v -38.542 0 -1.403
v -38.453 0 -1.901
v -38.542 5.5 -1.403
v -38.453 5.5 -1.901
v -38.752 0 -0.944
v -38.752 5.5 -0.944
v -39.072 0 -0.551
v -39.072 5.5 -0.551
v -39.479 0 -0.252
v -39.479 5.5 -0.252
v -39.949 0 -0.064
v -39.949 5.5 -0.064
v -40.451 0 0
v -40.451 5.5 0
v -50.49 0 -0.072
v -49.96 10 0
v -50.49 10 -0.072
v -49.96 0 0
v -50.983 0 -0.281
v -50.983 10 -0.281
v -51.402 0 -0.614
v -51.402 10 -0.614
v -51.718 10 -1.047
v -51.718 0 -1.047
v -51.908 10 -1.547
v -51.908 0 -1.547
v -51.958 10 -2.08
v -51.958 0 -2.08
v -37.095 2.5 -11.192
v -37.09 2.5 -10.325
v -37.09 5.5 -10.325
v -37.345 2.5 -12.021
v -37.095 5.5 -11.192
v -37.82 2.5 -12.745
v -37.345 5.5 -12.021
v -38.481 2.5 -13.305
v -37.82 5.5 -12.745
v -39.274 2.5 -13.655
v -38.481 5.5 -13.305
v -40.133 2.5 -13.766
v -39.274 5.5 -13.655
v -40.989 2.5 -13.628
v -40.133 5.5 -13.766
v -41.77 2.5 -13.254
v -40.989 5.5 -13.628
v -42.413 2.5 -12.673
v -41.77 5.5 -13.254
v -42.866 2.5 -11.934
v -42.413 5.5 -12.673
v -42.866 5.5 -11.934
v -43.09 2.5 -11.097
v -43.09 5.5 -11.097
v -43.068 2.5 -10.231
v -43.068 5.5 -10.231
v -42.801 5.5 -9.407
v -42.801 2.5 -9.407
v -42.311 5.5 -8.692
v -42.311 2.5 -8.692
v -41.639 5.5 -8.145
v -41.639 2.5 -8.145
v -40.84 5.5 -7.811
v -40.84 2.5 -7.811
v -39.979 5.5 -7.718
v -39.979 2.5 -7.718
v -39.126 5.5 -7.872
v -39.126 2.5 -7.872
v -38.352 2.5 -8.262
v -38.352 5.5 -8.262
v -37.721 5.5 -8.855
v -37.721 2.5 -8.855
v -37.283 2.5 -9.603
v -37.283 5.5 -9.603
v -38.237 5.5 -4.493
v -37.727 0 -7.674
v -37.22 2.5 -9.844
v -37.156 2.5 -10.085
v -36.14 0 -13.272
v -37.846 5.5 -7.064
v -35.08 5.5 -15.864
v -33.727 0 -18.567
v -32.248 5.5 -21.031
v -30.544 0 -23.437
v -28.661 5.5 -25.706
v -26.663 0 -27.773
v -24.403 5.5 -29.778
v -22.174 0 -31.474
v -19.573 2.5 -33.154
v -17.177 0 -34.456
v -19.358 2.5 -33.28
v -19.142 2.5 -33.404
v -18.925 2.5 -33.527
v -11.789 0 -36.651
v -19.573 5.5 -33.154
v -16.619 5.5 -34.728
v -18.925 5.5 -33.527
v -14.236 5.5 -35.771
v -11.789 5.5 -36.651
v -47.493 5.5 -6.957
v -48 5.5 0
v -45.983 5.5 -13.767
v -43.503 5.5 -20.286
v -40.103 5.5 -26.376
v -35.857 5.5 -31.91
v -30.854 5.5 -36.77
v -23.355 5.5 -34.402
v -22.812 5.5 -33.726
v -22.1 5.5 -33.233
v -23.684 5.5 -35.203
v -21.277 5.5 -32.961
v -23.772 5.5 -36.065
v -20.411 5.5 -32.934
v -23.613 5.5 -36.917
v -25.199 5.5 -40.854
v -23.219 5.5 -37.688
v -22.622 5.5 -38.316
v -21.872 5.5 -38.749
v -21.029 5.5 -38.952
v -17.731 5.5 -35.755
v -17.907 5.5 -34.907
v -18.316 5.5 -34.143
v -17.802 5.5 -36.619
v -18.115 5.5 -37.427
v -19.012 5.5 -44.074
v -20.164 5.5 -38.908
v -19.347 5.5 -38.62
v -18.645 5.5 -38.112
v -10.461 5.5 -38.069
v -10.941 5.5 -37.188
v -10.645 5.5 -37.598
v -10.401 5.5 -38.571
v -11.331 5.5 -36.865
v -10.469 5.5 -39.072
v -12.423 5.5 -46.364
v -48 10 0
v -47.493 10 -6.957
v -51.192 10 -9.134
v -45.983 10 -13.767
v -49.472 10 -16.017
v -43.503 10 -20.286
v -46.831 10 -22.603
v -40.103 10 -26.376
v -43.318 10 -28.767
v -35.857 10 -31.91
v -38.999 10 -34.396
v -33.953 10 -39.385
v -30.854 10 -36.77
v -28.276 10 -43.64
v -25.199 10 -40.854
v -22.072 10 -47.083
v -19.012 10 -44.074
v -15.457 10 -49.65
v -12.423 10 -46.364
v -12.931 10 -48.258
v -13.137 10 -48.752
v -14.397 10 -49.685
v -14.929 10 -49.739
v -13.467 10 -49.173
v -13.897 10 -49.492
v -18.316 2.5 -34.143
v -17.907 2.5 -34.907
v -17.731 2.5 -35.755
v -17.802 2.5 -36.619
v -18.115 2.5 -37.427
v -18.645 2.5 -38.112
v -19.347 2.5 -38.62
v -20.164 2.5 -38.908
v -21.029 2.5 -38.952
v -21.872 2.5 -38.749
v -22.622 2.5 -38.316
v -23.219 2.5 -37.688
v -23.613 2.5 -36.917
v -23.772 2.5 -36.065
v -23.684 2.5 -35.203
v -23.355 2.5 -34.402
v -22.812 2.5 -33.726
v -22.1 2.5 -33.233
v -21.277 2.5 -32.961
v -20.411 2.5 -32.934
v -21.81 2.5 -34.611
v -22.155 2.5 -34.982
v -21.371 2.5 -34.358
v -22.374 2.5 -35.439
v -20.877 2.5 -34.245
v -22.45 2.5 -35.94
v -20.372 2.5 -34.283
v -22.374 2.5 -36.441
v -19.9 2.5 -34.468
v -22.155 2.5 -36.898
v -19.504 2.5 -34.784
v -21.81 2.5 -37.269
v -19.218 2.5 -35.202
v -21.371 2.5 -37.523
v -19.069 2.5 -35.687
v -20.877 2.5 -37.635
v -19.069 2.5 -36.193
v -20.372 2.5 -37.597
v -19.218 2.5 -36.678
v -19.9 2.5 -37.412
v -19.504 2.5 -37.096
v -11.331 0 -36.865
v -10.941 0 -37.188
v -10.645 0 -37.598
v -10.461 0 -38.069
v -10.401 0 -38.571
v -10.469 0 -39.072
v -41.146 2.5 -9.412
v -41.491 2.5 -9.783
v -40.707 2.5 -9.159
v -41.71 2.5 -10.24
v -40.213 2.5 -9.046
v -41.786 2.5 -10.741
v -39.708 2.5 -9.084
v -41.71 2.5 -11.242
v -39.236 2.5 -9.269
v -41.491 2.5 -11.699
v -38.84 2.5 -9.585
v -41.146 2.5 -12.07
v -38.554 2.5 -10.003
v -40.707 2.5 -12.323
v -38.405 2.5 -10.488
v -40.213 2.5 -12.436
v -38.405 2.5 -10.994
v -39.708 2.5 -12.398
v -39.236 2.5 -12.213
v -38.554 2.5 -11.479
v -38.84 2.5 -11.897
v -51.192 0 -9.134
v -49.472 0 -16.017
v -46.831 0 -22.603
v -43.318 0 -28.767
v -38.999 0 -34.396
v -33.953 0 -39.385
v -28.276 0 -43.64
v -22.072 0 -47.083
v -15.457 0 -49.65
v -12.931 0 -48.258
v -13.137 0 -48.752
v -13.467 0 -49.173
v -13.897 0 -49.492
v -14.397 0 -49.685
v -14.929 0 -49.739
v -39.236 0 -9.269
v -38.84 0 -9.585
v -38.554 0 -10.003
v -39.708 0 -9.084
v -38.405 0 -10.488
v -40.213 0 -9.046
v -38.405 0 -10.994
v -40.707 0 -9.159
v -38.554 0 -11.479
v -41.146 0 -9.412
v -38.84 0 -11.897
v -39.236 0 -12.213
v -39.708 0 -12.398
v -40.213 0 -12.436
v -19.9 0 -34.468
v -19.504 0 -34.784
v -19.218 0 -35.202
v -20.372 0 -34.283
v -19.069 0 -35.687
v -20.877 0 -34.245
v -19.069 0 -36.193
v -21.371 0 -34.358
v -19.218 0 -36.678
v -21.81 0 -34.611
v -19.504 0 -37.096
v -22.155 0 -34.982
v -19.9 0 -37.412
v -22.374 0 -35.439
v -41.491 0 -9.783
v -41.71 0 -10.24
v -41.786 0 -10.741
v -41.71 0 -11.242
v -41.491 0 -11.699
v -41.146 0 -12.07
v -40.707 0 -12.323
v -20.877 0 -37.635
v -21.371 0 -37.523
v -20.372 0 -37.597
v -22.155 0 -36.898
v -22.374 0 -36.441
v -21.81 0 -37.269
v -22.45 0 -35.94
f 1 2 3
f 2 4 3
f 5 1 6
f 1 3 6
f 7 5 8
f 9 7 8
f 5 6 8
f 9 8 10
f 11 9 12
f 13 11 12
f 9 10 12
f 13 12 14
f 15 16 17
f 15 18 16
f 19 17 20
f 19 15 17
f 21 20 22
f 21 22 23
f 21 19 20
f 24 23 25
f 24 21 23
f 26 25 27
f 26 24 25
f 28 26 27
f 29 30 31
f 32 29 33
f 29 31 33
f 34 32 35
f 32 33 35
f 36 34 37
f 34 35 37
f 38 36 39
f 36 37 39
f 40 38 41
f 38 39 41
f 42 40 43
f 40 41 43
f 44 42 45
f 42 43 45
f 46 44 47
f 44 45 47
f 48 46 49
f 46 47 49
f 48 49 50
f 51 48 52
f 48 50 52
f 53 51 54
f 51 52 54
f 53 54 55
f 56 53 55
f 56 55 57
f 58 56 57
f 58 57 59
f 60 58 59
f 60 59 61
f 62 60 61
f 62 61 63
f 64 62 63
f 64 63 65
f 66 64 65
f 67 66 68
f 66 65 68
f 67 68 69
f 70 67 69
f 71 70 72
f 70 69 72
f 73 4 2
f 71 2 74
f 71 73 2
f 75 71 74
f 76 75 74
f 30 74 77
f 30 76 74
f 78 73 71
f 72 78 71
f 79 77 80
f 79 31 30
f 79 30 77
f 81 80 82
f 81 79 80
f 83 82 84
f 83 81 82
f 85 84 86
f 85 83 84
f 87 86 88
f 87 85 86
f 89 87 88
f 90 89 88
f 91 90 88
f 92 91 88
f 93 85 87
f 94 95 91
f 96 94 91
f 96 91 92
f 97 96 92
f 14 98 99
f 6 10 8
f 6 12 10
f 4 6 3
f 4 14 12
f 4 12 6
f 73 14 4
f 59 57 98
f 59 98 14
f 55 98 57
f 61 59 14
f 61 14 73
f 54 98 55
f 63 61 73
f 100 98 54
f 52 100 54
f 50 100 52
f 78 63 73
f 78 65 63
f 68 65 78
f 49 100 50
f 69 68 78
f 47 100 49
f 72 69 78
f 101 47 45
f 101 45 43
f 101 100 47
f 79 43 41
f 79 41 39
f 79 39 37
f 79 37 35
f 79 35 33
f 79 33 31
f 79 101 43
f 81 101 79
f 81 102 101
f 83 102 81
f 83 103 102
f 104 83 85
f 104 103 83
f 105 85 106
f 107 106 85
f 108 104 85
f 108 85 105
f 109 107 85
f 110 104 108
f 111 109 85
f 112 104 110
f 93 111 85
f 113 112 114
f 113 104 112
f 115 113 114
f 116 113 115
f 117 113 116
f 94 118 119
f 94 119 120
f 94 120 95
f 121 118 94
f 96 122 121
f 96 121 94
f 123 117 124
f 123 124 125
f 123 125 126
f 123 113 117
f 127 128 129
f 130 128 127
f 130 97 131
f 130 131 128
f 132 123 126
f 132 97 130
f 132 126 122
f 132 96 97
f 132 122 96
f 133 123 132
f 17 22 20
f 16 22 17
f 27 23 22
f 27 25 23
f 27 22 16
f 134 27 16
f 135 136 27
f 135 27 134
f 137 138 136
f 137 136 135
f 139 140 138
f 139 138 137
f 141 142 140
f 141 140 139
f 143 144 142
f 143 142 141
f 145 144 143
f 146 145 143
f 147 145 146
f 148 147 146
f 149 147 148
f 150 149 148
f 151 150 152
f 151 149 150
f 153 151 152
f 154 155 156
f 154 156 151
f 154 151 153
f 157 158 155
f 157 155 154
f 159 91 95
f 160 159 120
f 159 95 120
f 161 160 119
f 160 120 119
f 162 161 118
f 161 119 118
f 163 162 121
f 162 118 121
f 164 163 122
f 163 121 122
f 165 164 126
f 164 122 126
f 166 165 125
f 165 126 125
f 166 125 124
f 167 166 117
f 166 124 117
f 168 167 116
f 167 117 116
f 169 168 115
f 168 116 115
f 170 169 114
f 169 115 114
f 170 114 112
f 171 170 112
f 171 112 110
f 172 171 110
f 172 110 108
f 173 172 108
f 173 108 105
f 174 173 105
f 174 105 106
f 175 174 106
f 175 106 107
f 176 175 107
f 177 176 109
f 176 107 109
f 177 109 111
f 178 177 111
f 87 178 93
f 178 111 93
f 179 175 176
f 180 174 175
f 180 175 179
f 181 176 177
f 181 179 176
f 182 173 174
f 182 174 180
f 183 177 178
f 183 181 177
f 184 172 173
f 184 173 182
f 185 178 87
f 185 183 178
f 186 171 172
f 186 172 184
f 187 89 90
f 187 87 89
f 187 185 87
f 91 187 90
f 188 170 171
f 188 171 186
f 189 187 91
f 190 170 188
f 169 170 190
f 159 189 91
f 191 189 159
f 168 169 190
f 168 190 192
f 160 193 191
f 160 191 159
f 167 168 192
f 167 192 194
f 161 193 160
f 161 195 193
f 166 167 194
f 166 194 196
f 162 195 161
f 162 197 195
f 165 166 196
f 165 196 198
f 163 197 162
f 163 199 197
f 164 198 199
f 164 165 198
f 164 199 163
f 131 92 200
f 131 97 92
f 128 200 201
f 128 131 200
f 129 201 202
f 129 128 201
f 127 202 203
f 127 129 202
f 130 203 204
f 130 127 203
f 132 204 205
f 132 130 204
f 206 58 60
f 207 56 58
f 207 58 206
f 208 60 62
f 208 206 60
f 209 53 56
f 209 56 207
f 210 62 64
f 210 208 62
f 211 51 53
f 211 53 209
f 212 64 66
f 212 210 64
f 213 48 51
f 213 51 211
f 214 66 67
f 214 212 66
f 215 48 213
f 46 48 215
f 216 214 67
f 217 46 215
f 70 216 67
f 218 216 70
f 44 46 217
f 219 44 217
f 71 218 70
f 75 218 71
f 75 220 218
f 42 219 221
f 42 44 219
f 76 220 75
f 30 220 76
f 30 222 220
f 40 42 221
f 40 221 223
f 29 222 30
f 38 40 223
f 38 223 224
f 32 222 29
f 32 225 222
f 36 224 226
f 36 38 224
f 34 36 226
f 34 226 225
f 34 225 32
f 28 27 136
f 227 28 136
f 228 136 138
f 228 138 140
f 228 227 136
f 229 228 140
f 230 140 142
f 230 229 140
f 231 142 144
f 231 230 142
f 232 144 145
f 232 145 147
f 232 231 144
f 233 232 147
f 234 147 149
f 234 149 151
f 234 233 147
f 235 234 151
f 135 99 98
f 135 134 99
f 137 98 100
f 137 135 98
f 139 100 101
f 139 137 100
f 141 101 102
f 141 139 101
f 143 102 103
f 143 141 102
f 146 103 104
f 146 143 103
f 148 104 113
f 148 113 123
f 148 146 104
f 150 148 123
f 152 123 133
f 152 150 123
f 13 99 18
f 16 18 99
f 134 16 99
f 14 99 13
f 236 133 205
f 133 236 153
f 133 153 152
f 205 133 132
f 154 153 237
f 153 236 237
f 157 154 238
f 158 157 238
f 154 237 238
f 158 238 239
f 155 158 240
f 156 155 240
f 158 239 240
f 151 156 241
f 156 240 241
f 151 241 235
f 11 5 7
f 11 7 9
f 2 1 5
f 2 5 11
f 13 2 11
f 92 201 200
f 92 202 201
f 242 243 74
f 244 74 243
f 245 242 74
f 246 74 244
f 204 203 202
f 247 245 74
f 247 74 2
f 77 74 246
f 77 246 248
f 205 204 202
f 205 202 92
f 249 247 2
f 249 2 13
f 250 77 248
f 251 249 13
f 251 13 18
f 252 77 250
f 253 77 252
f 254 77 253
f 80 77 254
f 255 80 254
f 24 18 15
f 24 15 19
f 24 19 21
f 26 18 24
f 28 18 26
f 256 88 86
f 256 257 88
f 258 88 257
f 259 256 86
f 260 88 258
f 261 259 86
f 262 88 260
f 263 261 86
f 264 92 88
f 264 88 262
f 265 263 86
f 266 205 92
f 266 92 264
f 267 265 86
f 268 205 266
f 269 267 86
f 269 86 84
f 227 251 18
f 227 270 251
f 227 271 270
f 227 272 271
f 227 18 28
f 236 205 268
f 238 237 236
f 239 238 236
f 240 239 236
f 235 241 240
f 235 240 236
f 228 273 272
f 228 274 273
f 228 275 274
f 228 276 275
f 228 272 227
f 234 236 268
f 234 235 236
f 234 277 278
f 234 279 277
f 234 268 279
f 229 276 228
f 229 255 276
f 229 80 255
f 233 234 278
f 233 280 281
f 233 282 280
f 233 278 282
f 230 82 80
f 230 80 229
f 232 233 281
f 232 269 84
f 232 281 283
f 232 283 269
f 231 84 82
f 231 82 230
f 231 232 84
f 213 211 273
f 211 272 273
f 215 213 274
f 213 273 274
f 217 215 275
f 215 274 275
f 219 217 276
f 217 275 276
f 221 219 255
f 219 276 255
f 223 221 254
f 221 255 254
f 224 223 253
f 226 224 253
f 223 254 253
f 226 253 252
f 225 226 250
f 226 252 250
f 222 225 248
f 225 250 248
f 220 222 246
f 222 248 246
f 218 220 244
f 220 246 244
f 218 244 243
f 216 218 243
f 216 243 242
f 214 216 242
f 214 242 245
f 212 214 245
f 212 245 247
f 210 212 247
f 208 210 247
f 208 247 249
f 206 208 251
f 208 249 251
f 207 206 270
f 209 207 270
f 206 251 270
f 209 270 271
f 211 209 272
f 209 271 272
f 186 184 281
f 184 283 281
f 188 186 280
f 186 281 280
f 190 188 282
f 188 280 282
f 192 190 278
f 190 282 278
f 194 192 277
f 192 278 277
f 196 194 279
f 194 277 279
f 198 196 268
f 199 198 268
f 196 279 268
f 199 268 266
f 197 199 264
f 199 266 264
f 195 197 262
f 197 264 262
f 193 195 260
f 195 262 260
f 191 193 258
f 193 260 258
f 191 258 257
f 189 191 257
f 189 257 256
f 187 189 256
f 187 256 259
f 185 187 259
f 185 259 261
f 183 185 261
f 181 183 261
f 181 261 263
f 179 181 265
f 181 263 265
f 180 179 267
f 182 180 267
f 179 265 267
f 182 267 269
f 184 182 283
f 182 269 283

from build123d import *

# Parameters (mm, degrees)
REVOLVE_1_ANGLE             = 75
HOLE_WIZARD_M31_D           = 3.4
HOLE_WIZARD_M31_CBORE_D     = 6.05
HOLE_WIZARD_M31_CBORE_DEPTH = 3
FILLET_1_R                  = 2


with BuildPart() as part:
    # Эскиз1 → Повернуть1 (revolve)
    with BuildSketch(Plane.XY):
        Polygon((-52, 0), (-38.5, 0), (-38.5, 5.5), (-48, 5.5), (-48, 10), (-52, 10), align=None)
    revolve(axis=Axis((0, 0, 0), (0, -1, 0)), revolution_arc=REVOLVE_1_ANGLE)

    # Цековка для винта с заклепочной головкой M31 (through all)
    with Locations(Plane(origin=(0, 5.5, 0), x_dir=(1, 0, 0), z_dir=(0, 1, 0))):
        with Locations((-20.75, 35.940054257), (-40.085921791, 10.740990372)):
            CounterBoreHole(HOLE_WIZARD_M31_D / 2, HOLE_WIZARD_M31_CBORE_D / 2, HOLE_WIZARD_M31_CBORE_DEPTH)

    # Скругление1
    fillet_1_edges = [part.edges().sort_by_distance(p)[0] for p in [
        (-9.964533236, 2.75, -37.188144312),
        (-13.458590345, 5, -50.228142967),
        (-52, 5, 0),
        (-38.5, 2.75, 0),
    ]]
    fillet(fillet_1_edges, radius=FILLET_1_R)


solid = part.part
